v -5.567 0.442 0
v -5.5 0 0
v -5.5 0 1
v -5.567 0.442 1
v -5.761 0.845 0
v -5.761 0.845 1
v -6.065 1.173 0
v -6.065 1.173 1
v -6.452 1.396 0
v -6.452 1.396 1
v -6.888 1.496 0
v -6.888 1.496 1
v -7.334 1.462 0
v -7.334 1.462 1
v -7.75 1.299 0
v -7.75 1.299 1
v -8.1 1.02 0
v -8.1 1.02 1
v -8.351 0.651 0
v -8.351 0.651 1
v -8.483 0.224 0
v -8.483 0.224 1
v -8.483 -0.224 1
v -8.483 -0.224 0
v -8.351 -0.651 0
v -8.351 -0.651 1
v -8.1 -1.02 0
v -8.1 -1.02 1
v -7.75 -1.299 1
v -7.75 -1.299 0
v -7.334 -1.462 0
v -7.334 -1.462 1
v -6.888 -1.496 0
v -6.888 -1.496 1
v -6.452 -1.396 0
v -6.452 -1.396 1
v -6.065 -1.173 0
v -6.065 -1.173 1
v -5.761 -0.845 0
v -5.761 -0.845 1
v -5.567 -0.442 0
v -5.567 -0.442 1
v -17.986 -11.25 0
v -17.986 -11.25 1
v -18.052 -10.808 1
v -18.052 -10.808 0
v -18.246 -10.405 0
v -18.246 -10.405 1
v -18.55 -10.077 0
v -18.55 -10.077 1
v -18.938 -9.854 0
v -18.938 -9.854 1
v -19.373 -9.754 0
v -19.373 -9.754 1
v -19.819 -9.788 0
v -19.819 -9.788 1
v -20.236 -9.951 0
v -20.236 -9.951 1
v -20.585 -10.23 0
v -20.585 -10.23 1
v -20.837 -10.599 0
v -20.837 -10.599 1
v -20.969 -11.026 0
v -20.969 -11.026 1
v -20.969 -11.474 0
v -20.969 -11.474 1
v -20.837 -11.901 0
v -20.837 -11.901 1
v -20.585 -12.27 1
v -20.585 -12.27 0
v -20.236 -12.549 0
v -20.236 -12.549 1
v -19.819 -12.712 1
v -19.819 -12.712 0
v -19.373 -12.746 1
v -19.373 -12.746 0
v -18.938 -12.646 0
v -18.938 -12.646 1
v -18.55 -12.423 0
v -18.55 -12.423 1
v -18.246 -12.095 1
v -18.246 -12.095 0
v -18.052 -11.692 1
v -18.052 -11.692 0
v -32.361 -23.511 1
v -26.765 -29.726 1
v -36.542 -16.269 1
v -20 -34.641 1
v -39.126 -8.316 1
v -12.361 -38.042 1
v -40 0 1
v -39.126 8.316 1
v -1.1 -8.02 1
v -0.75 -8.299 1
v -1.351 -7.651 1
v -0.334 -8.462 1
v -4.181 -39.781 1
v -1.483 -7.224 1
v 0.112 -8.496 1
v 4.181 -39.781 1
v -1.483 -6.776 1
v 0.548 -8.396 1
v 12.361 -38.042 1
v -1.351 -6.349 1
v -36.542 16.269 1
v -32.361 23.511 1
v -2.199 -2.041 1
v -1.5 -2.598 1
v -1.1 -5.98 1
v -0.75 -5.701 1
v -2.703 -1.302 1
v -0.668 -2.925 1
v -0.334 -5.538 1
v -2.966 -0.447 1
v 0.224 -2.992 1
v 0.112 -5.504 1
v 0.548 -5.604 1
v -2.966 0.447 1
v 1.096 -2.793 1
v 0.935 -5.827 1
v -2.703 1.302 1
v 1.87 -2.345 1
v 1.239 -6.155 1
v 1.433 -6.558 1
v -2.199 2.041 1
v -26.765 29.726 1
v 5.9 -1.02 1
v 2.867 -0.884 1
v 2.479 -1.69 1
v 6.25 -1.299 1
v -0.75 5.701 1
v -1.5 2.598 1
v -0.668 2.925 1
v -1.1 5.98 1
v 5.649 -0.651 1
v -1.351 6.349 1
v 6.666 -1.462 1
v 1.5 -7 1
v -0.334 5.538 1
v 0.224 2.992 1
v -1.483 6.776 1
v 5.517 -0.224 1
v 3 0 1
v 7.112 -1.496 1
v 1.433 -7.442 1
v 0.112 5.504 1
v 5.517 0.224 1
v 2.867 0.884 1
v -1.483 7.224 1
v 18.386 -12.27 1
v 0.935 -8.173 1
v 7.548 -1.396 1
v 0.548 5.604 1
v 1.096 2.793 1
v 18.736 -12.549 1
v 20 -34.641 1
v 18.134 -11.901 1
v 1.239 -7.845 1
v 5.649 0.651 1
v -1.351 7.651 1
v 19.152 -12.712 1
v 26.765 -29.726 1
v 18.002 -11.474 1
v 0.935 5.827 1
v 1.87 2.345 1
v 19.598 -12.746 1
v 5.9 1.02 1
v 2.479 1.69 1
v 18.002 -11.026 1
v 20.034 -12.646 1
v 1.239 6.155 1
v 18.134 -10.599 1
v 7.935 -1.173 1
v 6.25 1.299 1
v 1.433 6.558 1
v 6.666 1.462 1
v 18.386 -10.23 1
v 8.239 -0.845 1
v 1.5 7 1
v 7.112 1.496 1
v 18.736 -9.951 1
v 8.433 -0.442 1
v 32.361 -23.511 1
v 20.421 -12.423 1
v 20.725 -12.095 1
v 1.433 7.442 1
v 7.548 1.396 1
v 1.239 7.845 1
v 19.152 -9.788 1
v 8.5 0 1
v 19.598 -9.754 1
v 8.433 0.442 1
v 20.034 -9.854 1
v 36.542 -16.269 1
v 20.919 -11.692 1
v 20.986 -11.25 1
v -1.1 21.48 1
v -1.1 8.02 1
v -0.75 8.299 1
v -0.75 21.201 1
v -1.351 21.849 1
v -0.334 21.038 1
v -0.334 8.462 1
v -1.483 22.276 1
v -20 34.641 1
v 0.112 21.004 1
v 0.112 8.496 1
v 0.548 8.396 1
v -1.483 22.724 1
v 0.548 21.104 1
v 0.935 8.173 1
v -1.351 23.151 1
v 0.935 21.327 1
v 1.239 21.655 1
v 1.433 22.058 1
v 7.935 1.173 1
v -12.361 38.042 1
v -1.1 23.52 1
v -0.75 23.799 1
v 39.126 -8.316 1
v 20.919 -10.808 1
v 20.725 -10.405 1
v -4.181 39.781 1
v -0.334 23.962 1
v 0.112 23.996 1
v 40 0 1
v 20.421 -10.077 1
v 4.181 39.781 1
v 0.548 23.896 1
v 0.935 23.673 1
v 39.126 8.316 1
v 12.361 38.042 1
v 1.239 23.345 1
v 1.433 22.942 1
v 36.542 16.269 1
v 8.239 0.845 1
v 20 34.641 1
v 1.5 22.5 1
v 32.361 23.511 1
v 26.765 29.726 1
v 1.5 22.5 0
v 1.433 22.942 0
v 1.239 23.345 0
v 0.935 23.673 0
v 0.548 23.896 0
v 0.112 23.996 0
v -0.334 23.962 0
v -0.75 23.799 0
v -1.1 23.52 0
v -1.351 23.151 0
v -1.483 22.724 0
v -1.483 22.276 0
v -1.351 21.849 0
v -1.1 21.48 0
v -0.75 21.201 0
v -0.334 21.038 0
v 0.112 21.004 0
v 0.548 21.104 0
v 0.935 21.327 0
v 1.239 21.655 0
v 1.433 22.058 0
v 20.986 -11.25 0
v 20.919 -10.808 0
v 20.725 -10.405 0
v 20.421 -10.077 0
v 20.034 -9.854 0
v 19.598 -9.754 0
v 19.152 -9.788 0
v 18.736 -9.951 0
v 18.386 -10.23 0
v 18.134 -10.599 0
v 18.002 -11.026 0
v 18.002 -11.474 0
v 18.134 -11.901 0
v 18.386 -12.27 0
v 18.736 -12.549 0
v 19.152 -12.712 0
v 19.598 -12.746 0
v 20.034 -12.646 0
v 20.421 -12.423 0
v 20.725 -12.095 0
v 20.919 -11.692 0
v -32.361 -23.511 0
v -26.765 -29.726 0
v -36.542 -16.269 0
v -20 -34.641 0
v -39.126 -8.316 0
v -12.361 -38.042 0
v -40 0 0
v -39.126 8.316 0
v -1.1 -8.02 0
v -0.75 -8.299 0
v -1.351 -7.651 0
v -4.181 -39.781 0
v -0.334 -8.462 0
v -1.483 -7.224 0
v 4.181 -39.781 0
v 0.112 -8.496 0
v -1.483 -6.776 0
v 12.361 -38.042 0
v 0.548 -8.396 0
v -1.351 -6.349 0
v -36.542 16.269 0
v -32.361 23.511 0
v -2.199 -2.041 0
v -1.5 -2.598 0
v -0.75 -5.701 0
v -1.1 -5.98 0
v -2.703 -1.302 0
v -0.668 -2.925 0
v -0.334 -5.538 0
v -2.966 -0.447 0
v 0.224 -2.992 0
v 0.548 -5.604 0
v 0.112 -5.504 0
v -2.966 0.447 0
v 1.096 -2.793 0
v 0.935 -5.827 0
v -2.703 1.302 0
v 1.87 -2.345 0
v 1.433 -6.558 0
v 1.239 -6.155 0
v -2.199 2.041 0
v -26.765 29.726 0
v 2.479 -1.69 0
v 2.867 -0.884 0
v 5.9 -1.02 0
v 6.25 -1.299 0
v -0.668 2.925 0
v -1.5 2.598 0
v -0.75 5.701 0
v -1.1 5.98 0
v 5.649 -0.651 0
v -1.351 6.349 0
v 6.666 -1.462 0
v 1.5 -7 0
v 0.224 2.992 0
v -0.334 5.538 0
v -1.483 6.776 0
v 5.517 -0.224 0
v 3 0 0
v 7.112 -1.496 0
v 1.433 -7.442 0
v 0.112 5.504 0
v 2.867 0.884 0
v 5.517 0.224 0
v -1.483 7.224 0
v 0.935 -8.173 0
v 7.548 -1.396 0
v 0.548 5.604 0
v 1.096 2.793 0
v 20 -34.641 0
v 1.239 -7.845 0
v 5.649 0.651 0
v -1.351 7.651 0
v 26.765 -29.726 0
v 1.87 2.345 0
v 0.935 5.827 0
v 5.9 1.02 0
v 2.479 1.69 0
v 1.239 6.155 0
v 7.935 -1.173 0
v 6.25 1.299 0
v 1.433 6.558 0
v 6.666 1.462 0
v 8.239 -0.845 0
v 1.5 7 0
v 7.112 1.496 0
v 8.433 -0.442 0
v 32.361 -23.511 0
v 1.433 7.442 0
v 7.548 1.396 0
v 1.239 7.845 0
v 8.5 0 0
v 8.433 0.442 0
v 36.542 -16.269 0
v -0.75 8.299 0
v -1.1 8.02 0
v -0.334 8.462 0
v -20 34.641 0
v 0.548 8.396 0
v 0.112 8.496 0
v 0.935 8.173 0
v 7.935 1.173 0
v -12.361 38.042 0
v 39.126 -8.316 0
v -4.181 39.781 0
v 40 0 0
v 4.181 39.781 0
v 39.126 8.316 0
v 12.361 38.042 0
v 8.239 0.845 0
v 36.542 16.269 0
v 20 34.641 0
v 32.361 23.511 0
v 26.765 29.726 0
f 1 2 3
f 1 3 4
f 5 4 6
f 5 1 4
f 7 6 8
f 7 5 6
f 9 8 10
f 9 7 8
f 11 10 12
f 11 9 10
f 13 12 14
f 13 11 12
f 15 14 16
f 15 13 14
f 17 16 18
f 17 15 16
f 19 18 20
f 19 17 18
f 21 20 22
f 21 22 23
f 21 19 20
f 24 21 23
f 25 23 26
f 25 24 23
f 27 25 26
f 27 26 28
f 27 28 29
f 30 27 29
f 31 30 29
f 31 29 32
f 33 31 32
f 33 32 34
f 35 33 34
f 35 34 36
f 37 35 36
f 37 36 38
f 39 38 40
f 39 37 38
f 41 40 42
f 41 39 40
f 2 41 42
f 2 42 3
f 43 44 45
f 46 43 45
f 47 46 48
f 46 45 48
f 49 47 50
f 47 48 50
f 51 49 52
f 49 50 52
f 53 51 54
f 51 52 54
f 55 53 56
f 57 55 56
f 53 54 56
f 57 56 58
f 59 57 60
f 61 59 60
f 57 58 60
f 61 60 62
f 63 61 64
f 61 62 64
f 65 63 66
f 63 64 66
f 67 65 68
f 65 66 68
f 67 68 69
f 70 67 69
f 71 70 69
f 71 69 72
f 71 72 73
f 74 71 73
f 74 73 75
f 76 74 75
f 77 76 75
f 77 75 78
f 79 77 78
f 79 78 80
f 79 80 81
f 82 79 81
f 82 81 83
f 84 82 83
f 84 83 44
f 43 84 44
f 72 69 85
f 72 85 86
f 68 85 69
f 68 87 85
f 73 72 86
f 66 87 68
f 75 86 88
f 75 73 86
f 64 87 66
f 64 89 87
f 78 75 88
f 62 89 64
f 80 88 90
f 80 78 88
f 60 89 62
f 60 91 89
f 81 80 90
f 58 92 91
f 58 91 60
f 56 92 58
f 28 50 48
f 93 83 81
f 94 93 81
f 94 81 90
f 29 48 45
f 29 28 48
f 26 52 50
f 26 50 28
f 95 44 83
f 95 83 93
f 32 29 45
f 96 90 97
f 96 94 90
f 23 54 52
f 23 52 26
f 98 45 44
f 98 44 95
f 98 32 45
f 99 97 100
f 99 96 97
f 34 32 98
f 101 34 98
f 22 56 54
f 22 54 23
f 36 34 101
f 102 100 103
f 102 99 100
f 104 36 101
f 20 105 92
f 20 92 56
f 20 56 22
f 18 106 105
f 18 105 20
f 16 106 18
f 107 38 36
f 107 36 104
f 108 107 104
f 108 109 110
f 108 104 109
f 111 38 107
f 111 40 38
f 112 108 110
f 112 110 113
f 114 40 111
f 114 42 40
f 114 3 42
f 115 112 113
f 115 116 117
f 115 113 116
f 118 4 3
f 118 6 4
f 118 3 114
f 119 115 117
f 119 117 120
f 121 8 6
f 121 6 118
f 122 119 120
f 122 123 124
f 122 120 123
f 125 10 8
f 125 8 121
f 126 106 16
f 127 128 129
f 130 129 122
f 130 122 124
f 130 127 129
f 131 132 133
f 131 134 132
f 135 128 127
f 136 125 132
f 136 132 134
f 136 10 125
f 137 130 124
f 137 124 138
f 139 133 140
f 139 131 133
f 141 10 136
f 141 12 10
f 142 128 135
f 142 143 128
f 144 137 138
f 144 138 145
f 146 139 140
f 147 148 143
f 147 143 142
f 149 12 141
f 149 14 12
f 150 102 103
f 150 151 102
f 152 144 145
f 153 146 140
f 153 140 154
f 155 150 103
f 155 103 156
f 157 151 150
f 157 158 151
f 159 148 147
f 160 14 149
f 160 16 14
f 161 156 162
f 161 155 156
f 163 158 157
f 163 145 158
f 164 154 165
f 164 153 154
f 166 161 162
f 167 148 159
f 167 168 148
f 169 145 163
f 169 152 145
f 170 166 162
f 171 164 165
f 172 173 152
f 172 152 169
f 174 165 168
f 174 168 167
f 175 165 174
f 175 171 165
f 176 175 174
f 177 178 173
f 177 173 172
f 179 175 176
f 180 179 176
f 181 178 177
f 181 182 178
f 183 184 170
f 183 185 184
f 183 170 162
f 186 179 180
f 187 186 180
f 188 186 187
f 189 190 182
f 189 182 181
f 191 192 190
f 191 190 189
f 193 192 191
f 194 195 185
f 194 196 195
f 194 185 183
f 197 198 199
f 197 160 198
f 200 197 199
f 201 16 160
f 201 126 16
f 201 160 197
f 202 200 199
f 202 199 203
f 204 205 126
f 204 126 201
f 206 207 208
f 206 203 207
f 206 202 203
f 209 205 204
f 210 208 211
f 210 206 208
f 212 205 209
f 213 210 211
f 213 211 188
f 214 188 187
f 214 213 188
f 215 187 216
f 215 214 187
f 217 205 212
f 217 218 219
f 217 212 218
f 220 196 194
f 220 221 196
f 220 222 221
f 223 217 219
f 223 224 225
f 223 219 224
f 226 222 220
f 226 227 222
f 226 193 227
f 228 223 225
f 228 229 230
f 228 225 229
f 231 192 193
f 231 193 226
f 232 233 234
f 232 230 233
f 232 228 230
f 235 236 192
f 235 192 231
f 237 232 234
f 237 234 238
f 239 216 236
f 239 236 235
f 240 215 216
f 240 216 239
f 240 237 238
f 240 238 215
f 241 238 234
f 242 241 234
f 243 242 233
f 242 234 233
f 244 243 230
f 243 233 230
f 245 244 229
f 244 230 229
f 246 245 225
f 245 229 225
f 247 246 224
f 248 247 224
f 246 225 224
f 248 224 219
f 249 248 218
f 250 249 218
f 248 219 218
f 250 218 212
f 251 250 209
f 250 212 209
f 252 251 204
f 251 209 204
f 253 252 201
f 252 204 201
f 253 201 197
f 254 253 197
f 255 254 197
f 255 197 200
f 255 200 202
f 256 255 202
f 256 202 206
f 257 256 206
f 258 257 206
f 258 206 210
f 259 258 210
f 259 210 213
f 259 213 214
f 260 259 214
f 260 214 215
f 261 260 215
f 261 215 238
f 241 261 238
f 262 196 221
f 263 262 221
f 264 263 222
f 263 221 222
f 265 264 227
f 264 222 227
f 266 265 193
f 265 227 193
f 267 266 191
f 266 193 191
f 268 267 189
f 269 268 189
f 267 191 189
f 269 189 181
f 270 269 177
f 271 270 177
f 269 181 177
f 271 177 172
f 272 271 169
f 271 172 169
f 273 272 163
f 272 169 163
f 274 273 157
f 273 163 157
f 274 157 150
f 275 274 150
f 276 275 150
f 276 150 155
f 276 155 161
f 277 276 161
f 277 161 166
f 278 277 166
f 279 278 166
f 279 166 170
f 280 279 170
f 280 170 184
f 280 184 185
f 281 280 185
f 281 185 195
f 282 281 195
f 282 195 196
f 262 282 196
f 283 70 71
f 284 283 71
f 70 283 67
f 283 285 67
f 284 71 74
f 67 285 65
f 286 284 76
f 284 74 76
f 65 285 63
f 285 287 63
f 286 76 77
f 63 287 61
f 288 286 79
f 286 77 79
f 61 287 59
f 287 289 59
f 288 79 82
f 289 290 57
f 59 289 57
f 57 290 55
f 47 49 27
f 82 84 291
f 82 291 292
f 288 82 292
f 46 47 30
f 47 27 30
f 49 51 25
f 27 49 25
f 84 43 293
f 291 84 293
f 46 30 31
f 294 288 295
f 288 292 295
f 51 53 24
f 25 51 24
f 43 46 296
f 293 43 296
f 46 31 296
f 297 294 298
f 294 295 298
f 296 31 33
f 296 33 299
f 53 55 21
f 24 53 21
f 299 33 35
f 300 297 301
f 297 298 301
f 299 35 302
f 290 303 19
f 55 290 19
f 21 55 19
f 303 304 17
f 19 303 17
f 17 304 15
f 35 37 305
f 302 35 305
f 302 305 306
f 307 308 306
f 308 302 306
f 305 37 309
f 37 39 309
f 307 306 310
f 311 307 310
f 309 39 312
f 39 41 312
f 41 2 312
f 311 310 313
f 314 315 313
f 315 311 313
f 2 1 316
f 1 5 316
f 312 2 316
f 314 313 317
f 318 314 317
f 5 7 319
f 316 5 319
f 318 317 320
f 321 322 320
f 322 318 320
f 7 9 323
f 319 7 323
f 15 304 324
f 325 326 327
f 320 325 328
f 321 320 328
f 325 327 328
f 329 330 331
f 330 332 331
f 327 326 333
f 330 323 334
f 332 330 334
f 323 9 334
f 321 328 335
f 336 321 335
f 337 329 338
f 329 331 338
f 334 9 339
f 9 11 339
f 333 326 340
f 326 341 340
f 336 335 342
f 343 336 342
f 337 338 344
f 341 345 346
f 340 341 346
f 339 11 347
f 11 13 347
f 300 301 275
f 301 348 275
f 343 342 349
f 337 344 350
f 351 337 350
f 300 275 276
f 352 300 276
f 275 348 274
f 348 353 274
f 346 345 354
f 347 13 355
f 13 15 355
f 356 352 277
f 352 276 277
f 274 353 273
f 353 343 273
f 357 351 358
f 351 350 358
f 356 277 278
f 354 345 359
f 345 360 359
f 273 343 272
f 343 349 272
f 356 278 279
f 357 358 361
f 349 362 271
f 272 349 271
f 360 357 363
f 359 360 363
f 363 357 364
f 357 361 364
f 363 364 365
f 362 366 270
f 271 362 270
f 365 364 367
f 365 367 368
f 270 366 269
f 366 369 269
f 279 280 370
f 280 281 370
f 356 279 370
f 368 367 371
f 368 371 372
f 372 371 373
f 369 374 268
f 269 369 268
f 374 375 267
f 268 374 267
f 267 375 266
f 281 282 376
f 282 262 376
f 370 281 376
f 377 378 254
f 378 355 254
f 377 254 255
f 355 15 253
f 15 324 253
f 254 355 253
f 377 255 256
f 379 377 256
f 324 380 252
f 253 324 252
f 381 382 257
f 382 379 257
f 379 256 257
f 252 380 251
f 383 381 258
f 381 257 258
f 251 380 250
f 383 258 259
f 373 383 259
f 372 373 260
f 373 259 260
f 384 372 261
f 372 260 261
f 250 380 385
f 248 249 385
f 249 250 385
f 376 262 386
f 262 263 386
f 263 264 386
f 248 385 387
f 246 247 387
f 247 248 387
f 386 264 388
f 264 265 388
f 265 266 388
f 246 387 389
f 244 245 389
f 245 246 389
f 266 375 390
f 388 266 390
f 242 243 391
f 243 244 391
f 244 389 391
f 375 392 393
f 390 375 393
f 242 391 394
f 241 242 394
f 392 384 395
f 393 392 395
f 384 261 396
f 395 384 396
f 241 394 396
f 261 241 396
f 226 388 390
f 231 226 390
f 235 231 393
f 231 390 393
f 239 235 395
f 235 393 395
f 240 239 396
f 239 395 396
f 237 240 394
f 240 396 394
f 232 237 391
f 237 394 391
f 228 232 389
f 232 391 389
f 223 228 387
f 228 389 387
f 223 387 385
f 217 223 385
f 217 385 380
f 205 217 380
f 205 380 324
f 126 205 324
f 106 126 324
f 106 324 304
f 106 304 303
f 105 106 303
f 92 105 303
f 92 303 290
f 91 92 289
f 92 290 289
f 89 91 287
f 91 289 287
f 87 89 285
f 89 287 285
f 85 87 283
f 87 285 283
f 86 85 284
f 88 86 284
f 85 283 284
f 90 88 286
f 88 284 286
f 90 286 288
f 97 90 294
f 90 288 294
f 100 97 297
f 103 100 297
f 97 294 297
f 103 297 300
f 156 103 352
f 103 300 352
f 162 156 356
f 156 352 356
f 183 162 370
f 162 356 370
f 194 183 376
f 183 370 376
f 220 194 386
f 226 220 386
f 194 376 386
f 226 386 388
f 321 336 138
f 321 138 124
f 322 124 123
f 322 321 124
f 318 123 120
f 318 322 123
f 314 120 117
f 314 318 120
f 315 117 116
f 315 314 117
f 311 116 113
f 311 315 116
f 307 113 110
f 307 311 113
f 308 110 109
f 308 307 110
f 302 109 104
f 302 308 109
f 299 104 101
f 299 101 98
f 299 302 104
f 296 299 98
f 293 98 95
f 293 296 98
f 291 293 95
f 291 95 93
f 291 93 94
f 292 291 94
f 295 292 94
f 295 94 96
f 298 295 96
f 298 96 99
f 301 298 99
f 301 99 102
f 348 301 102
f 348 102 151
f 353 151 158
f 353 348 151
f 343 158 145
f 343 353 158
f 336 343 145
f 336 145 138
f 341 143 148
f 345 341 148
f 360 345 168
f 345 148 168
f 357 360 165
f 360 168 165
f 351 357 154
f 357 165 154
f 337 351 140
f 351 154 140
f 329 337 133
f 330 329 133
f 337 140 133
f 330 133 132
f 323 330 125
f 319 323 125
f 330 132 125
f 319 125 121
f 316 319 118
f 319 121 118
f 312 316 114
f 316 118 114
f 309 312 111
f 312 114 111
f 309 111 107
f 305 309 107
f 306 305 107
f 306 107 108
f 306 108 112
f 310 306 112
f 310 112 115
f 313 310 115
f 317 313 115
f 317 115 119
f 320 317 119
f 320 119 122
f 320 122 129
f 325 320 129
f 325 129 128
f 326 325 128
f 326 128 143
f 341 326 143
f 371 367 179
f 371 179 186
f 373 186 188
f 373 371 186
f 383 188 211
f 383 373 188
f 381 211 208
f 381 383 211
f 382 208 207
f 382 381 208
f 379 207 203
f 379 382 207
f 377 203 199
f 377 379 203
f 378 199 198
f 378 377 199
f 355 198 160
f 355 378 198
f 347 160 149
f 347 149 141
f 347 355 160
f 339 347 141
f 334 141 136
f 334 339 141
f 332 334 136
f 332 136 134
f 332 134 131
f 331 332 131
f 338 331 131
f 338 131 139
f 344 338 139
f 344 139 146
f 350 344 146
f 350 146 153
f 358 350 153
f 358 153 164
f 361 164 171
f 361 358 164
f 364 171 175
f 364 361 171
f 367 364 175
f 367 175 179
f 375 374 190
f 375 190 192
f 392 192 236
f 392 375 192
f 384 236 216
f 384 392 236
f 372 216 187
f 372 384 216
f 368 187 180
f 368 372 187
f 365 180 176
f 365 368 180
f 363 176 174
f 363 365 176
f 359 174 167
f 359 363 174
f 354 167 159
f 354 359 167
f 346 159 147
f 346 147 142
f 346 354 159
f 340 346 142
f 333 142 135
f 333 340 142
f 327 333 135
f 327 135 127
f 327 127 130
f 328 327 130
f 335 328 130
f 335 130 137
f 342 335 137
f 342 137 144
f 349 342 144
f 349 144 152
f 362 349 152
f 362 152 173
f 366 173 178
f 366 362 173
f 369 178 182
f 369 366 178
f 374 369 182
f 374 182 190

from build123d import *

# Parameters (mm, degrees)
SKETCH_1_R          = 40
SKETCH_1_R_2        = 2.5
SKETCH_1_R_3        = 1.5
EXTRUDE_1_DEPTH     = 1
SKETCH_2_R          = 1.5
CUT_EXTRUDE_1_DEPTH = 10
SKETCH_3_R          = 3
CUT_EXTRUDE_2_DEPTH = 10


with BuildPart() as part:
    # 草图1 → 凸台-拉伸1 (new body)
    with BuildSketch(Plane.XY):
        Circle(SKETCH_1_R)
        Circle(SKETCH_1_R_2, mode=Mode.SUBTRACT)
        with Locations((0, 7)):
            Circle(SKETCH_1_R_3, mode=Mode.SUBTRACT)
        with Locations((7, 0)):
            Circle(SKETCH_1_R_3, mode=Mode.SUBTRACT)
        with Locations((0, -7)):
            Circle(SKETCH_1_R_3, mode=Mode.SUBTRACT)
        with Locations((-7, 0)):
            Circle(SKETCH_1_R_3, mode=Mode.SUBTRACT)
    extrude(amount=EXTRUDE_1_DEPTH)

    # 草图2 → 切除-拉伸1 (cut)
    with BuildSketch(Plane.XY.offset(1)):
        with Locations((0, 22.5)):
            Circle(SKETCH_2_R)
        with Locations((19.485571585, -11.25)):
            Circle(SKETCH_2_R)
        with Locations((-19.485571585, -11.25)):
            Circle(SKETCH_2_R)
    extrude(amount=-CUT_EXTRUDE_1_DEPTH, mode=Mode.SUBTRACT)

    # 草图3 → 切除-拉伸2 (cut)
    with BuildSketch(Plane.XY.offset(1)):
        Circle(SKETCH_3_R)
    extrude(amount=-CUT_EXTRUDE_2_DEPTH, mode=Mode.SUBTRACT)


solid = part.part
